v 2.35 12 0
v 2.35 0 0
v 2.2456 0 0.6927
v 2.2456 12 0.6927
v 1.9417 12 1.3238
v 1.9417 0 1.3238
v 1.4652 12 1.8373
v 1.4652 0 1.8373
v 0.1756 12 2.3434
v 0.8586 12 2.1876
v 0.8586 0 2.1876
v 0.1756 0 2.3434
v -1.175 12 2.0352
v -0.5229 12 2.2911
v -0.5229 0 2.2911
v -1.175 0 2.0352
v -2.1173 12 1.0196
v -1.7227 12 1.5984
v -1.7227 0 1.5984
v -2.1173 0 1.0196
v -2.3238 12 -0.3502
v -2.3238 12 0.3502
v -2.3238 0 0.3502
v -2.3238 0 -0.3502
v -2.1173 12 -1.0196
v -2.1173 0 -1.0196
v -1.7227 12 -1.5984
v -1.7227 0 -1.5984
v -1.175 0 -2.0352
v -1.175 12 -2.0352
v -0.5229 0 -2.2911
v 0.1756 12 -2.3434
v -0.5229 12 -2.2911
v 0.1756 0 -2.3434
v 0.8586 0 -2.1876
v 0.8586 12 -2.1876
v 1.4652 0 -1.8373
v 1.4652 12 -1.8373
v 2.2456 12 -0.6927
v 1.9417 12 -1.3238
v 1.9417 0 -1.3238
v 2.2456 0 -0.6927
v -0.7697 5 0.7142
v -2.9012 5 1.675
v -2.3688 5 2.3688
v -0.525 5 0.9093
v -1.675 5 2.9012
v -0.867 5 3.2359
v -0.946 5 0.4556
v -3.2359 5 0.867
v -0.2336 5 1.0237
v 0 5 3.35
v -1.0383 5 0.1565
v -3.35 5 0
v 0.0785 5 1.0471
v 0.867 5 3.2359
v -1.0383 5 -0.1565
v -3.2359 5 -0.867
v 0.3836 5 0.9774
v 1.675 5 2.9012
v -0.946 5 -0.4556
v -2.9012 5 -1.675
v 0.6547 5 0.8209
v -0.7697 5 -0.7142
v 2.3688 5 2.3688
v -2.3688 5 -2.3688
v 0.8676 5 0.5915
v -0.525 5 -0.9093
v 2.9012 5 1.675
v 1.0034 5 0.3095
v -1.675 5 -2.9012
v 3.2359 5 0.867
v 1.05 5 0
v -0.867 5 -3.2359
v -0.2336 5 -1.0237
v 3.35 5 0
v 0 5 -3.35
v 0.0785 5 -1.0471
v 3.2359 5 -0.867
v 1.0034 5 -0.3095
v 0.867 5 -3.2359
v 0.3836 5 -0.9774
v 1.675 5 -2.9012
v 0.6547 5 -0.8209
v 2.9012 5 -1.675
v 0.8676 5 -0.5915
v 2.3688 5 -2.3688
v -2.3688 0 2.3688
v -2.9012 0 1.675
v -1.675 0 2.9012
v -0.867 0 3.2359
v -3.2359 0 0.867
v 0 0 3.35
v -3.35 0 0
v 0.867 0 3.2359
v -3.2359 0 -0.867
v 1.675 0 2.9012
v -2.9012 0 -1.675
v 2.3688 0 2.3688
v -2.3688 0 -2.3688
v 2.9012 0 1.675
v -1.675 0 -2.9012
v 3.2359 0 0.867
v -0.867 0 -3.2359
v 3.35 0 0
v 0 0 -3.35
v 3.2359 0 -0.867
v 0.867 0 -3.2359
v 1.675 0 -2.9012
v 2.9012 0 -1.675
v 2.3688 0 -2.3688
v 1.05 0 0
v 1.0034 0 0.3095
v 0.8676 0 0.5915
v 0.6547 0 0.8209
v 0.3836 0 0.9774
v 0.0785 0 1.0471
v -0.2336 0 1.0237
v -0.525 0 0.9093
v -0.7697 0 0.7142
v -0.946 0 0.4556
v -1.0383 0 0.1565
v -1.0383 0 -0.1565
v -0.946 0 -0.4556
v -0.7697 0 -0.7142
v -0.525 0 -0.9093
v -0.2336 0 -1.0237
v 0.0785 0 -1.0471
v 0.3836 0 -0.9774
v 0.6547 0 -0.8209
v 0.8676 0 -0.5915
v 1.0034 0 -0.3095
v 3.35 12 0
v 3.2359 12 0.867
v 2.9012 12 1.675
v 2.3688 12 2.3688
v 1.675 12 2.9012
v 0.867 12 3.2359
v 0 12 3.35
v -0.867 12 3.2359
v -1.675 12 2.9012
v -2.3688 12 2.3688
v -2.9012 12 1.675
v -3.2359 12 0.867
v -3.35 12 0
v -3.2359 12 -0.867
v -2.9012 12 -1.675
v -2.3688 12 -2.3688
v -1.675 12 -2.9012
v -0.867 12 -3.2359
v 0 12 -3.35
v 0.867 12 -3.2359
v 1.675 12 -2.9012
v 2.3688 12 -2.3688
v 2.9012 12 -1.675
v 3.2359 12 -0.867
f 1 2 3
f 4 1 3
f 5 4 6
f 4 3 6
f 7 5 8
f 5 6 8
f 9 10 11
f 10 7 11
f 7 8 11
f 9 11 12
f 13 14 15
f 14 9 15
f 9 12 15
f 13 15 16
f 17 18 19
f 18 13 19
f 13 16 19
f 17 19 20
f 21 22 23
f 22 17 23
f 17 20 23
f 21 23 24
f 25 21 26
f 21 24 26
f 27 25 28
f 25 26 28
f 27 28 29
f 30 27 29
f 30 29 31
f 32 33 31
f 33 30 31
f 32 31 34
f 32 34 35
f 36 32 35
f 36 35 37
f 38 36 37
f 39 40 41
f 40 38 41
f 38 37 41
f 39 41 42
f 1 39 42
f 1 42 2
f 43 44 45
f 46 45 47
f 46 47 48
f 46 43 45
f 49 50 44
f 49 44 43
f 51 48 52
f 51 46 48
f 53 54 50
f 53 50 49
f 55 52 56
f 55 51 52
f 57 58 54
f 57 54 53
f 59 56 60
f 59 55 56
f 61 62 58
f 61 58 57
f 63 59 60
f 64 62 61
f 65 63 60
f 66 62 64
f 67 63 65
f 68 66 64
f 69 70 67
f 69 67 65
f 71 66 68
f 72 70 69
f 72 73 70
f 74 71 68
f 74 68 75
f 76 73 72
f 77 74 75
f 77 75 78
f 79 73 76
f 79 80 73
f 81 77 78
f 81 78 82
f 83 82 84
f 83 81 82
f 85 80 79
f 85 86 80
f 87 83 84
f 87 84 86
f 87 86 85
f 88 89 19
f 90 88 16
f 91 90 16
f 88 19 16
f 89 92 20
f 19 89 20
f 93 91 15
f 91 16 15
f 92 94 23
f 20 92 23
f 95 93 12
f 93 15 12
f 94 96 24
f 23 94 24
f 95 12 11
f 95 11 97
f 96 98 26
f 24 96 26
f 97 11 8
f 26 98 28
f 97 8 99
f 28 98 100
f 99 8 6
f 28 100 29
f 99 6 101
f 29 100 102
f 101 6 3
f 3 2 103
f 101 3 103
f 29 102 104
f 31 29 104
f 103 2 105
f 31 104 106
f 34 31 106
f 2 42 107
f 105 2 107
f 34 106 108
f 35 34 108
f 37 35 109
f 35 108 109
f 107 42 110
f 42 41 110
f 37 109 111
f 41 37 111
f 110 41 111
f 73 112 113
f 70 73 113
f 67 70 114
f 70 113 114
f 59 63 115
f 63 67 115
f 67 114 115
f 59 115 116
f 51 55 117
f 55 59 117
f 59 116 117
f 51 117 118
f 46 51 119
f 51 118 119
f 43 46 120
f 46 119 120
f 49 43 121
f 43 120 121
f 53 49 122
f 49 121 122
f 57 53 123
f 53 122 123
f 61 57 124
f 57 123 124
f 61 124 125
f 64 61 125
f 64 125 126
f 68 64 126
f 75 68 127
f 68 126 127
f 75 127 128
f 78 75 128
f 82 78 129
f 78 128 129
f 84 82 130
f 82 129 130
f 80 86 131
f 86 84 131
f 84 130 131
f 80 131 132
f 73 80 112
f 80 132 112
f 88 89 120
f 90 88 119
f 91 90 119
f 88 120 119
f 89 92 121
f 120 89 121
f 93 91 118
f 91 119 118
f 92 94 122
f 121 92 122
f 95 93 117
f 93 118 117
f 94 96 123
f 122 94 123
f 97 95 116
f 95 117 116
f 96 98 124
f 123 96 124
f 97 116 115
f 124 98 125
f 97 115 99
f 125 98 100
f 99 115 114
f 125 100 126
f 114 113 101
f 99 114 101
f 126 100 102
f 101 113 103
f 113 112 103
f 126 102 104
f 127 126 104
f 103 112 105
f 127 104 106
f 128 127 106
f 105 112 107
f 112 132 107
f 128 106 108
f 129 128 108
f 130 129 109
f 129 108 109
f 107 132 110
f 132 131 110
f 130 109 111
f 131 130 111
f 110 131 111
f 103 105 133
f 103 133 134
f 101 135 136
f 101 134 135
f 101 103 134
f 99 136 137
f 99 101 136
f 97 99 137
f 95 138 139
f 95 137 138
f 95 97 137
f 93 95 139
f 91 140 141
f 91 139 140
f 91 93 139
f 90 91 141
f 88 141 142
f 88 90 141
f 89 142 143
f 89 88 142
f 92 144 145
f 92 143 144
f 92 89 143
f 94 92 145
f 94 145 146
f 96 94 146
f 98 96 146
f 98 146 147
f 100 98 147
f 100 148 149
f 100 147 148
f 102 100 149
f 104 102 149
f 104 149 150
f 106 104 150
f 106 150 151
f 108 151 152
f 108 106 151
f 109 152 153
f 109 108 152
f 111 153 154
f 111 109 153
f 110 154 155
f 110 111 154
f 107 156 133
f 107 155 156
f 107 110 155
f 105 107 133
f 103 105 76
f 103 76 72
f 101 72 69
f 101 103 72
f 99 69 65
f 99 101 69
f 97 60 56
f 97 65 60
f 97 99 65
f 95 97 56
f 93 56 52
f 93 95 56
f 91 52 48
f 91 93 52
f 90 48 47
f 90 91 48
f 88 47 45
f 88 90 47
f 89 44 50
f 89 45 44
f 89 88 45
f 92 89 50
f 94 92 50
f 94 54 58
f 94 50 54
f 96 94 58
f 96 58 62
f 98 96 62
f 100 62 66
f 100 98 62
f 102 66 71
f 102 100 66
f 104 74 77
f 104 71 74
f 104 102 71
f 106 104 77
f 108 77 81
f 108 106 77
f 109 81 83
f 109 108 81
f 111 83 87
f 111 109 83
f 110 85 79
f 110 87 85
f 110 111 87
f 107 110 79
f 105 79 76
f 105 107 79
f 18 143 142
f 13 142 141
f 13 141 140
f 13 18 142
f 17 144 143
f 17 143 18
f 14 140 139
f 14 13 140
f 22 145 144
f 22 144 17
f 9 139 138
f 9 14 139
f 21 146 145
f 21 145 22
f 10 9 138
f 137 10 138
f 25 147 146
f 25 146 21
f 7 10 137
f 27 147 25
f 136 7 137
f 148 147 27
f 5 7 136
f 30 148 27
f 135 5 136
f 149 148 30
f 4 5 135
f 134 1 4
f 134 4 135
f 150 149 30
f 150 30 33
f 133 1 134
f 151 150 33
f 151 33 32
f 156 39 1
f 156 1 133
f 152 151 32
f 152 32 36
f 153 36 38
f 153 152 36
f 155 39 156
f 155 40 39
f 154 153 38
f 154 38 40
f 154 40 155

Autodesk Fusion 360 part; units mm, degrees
sketch "Sketch1" plane through (0, 0, 0) normal (0, 1, 0) x (1, 0, 0)
  circle A0 centre (0, 0) radius 1.05
  circle A1 centre (0, 0) radius 2.35
  circle A2 centre (0, 0) radius 3.35
  circle A3 centre (0, 0) radius 1.55
  dimension "d1" = 2.1
  dimension "d2" = 4.7
  dimension "d5" = 1
  dimension "d6" = 0.5
extrude "Extrude4" add sketch "Sketch1" along normal blind 5 contours A1 | A2 | A3 makes body 1
extrude "Extrude3" add sketch "Sketch1" along normal blind 12 separate body contours A2 makes body 2
